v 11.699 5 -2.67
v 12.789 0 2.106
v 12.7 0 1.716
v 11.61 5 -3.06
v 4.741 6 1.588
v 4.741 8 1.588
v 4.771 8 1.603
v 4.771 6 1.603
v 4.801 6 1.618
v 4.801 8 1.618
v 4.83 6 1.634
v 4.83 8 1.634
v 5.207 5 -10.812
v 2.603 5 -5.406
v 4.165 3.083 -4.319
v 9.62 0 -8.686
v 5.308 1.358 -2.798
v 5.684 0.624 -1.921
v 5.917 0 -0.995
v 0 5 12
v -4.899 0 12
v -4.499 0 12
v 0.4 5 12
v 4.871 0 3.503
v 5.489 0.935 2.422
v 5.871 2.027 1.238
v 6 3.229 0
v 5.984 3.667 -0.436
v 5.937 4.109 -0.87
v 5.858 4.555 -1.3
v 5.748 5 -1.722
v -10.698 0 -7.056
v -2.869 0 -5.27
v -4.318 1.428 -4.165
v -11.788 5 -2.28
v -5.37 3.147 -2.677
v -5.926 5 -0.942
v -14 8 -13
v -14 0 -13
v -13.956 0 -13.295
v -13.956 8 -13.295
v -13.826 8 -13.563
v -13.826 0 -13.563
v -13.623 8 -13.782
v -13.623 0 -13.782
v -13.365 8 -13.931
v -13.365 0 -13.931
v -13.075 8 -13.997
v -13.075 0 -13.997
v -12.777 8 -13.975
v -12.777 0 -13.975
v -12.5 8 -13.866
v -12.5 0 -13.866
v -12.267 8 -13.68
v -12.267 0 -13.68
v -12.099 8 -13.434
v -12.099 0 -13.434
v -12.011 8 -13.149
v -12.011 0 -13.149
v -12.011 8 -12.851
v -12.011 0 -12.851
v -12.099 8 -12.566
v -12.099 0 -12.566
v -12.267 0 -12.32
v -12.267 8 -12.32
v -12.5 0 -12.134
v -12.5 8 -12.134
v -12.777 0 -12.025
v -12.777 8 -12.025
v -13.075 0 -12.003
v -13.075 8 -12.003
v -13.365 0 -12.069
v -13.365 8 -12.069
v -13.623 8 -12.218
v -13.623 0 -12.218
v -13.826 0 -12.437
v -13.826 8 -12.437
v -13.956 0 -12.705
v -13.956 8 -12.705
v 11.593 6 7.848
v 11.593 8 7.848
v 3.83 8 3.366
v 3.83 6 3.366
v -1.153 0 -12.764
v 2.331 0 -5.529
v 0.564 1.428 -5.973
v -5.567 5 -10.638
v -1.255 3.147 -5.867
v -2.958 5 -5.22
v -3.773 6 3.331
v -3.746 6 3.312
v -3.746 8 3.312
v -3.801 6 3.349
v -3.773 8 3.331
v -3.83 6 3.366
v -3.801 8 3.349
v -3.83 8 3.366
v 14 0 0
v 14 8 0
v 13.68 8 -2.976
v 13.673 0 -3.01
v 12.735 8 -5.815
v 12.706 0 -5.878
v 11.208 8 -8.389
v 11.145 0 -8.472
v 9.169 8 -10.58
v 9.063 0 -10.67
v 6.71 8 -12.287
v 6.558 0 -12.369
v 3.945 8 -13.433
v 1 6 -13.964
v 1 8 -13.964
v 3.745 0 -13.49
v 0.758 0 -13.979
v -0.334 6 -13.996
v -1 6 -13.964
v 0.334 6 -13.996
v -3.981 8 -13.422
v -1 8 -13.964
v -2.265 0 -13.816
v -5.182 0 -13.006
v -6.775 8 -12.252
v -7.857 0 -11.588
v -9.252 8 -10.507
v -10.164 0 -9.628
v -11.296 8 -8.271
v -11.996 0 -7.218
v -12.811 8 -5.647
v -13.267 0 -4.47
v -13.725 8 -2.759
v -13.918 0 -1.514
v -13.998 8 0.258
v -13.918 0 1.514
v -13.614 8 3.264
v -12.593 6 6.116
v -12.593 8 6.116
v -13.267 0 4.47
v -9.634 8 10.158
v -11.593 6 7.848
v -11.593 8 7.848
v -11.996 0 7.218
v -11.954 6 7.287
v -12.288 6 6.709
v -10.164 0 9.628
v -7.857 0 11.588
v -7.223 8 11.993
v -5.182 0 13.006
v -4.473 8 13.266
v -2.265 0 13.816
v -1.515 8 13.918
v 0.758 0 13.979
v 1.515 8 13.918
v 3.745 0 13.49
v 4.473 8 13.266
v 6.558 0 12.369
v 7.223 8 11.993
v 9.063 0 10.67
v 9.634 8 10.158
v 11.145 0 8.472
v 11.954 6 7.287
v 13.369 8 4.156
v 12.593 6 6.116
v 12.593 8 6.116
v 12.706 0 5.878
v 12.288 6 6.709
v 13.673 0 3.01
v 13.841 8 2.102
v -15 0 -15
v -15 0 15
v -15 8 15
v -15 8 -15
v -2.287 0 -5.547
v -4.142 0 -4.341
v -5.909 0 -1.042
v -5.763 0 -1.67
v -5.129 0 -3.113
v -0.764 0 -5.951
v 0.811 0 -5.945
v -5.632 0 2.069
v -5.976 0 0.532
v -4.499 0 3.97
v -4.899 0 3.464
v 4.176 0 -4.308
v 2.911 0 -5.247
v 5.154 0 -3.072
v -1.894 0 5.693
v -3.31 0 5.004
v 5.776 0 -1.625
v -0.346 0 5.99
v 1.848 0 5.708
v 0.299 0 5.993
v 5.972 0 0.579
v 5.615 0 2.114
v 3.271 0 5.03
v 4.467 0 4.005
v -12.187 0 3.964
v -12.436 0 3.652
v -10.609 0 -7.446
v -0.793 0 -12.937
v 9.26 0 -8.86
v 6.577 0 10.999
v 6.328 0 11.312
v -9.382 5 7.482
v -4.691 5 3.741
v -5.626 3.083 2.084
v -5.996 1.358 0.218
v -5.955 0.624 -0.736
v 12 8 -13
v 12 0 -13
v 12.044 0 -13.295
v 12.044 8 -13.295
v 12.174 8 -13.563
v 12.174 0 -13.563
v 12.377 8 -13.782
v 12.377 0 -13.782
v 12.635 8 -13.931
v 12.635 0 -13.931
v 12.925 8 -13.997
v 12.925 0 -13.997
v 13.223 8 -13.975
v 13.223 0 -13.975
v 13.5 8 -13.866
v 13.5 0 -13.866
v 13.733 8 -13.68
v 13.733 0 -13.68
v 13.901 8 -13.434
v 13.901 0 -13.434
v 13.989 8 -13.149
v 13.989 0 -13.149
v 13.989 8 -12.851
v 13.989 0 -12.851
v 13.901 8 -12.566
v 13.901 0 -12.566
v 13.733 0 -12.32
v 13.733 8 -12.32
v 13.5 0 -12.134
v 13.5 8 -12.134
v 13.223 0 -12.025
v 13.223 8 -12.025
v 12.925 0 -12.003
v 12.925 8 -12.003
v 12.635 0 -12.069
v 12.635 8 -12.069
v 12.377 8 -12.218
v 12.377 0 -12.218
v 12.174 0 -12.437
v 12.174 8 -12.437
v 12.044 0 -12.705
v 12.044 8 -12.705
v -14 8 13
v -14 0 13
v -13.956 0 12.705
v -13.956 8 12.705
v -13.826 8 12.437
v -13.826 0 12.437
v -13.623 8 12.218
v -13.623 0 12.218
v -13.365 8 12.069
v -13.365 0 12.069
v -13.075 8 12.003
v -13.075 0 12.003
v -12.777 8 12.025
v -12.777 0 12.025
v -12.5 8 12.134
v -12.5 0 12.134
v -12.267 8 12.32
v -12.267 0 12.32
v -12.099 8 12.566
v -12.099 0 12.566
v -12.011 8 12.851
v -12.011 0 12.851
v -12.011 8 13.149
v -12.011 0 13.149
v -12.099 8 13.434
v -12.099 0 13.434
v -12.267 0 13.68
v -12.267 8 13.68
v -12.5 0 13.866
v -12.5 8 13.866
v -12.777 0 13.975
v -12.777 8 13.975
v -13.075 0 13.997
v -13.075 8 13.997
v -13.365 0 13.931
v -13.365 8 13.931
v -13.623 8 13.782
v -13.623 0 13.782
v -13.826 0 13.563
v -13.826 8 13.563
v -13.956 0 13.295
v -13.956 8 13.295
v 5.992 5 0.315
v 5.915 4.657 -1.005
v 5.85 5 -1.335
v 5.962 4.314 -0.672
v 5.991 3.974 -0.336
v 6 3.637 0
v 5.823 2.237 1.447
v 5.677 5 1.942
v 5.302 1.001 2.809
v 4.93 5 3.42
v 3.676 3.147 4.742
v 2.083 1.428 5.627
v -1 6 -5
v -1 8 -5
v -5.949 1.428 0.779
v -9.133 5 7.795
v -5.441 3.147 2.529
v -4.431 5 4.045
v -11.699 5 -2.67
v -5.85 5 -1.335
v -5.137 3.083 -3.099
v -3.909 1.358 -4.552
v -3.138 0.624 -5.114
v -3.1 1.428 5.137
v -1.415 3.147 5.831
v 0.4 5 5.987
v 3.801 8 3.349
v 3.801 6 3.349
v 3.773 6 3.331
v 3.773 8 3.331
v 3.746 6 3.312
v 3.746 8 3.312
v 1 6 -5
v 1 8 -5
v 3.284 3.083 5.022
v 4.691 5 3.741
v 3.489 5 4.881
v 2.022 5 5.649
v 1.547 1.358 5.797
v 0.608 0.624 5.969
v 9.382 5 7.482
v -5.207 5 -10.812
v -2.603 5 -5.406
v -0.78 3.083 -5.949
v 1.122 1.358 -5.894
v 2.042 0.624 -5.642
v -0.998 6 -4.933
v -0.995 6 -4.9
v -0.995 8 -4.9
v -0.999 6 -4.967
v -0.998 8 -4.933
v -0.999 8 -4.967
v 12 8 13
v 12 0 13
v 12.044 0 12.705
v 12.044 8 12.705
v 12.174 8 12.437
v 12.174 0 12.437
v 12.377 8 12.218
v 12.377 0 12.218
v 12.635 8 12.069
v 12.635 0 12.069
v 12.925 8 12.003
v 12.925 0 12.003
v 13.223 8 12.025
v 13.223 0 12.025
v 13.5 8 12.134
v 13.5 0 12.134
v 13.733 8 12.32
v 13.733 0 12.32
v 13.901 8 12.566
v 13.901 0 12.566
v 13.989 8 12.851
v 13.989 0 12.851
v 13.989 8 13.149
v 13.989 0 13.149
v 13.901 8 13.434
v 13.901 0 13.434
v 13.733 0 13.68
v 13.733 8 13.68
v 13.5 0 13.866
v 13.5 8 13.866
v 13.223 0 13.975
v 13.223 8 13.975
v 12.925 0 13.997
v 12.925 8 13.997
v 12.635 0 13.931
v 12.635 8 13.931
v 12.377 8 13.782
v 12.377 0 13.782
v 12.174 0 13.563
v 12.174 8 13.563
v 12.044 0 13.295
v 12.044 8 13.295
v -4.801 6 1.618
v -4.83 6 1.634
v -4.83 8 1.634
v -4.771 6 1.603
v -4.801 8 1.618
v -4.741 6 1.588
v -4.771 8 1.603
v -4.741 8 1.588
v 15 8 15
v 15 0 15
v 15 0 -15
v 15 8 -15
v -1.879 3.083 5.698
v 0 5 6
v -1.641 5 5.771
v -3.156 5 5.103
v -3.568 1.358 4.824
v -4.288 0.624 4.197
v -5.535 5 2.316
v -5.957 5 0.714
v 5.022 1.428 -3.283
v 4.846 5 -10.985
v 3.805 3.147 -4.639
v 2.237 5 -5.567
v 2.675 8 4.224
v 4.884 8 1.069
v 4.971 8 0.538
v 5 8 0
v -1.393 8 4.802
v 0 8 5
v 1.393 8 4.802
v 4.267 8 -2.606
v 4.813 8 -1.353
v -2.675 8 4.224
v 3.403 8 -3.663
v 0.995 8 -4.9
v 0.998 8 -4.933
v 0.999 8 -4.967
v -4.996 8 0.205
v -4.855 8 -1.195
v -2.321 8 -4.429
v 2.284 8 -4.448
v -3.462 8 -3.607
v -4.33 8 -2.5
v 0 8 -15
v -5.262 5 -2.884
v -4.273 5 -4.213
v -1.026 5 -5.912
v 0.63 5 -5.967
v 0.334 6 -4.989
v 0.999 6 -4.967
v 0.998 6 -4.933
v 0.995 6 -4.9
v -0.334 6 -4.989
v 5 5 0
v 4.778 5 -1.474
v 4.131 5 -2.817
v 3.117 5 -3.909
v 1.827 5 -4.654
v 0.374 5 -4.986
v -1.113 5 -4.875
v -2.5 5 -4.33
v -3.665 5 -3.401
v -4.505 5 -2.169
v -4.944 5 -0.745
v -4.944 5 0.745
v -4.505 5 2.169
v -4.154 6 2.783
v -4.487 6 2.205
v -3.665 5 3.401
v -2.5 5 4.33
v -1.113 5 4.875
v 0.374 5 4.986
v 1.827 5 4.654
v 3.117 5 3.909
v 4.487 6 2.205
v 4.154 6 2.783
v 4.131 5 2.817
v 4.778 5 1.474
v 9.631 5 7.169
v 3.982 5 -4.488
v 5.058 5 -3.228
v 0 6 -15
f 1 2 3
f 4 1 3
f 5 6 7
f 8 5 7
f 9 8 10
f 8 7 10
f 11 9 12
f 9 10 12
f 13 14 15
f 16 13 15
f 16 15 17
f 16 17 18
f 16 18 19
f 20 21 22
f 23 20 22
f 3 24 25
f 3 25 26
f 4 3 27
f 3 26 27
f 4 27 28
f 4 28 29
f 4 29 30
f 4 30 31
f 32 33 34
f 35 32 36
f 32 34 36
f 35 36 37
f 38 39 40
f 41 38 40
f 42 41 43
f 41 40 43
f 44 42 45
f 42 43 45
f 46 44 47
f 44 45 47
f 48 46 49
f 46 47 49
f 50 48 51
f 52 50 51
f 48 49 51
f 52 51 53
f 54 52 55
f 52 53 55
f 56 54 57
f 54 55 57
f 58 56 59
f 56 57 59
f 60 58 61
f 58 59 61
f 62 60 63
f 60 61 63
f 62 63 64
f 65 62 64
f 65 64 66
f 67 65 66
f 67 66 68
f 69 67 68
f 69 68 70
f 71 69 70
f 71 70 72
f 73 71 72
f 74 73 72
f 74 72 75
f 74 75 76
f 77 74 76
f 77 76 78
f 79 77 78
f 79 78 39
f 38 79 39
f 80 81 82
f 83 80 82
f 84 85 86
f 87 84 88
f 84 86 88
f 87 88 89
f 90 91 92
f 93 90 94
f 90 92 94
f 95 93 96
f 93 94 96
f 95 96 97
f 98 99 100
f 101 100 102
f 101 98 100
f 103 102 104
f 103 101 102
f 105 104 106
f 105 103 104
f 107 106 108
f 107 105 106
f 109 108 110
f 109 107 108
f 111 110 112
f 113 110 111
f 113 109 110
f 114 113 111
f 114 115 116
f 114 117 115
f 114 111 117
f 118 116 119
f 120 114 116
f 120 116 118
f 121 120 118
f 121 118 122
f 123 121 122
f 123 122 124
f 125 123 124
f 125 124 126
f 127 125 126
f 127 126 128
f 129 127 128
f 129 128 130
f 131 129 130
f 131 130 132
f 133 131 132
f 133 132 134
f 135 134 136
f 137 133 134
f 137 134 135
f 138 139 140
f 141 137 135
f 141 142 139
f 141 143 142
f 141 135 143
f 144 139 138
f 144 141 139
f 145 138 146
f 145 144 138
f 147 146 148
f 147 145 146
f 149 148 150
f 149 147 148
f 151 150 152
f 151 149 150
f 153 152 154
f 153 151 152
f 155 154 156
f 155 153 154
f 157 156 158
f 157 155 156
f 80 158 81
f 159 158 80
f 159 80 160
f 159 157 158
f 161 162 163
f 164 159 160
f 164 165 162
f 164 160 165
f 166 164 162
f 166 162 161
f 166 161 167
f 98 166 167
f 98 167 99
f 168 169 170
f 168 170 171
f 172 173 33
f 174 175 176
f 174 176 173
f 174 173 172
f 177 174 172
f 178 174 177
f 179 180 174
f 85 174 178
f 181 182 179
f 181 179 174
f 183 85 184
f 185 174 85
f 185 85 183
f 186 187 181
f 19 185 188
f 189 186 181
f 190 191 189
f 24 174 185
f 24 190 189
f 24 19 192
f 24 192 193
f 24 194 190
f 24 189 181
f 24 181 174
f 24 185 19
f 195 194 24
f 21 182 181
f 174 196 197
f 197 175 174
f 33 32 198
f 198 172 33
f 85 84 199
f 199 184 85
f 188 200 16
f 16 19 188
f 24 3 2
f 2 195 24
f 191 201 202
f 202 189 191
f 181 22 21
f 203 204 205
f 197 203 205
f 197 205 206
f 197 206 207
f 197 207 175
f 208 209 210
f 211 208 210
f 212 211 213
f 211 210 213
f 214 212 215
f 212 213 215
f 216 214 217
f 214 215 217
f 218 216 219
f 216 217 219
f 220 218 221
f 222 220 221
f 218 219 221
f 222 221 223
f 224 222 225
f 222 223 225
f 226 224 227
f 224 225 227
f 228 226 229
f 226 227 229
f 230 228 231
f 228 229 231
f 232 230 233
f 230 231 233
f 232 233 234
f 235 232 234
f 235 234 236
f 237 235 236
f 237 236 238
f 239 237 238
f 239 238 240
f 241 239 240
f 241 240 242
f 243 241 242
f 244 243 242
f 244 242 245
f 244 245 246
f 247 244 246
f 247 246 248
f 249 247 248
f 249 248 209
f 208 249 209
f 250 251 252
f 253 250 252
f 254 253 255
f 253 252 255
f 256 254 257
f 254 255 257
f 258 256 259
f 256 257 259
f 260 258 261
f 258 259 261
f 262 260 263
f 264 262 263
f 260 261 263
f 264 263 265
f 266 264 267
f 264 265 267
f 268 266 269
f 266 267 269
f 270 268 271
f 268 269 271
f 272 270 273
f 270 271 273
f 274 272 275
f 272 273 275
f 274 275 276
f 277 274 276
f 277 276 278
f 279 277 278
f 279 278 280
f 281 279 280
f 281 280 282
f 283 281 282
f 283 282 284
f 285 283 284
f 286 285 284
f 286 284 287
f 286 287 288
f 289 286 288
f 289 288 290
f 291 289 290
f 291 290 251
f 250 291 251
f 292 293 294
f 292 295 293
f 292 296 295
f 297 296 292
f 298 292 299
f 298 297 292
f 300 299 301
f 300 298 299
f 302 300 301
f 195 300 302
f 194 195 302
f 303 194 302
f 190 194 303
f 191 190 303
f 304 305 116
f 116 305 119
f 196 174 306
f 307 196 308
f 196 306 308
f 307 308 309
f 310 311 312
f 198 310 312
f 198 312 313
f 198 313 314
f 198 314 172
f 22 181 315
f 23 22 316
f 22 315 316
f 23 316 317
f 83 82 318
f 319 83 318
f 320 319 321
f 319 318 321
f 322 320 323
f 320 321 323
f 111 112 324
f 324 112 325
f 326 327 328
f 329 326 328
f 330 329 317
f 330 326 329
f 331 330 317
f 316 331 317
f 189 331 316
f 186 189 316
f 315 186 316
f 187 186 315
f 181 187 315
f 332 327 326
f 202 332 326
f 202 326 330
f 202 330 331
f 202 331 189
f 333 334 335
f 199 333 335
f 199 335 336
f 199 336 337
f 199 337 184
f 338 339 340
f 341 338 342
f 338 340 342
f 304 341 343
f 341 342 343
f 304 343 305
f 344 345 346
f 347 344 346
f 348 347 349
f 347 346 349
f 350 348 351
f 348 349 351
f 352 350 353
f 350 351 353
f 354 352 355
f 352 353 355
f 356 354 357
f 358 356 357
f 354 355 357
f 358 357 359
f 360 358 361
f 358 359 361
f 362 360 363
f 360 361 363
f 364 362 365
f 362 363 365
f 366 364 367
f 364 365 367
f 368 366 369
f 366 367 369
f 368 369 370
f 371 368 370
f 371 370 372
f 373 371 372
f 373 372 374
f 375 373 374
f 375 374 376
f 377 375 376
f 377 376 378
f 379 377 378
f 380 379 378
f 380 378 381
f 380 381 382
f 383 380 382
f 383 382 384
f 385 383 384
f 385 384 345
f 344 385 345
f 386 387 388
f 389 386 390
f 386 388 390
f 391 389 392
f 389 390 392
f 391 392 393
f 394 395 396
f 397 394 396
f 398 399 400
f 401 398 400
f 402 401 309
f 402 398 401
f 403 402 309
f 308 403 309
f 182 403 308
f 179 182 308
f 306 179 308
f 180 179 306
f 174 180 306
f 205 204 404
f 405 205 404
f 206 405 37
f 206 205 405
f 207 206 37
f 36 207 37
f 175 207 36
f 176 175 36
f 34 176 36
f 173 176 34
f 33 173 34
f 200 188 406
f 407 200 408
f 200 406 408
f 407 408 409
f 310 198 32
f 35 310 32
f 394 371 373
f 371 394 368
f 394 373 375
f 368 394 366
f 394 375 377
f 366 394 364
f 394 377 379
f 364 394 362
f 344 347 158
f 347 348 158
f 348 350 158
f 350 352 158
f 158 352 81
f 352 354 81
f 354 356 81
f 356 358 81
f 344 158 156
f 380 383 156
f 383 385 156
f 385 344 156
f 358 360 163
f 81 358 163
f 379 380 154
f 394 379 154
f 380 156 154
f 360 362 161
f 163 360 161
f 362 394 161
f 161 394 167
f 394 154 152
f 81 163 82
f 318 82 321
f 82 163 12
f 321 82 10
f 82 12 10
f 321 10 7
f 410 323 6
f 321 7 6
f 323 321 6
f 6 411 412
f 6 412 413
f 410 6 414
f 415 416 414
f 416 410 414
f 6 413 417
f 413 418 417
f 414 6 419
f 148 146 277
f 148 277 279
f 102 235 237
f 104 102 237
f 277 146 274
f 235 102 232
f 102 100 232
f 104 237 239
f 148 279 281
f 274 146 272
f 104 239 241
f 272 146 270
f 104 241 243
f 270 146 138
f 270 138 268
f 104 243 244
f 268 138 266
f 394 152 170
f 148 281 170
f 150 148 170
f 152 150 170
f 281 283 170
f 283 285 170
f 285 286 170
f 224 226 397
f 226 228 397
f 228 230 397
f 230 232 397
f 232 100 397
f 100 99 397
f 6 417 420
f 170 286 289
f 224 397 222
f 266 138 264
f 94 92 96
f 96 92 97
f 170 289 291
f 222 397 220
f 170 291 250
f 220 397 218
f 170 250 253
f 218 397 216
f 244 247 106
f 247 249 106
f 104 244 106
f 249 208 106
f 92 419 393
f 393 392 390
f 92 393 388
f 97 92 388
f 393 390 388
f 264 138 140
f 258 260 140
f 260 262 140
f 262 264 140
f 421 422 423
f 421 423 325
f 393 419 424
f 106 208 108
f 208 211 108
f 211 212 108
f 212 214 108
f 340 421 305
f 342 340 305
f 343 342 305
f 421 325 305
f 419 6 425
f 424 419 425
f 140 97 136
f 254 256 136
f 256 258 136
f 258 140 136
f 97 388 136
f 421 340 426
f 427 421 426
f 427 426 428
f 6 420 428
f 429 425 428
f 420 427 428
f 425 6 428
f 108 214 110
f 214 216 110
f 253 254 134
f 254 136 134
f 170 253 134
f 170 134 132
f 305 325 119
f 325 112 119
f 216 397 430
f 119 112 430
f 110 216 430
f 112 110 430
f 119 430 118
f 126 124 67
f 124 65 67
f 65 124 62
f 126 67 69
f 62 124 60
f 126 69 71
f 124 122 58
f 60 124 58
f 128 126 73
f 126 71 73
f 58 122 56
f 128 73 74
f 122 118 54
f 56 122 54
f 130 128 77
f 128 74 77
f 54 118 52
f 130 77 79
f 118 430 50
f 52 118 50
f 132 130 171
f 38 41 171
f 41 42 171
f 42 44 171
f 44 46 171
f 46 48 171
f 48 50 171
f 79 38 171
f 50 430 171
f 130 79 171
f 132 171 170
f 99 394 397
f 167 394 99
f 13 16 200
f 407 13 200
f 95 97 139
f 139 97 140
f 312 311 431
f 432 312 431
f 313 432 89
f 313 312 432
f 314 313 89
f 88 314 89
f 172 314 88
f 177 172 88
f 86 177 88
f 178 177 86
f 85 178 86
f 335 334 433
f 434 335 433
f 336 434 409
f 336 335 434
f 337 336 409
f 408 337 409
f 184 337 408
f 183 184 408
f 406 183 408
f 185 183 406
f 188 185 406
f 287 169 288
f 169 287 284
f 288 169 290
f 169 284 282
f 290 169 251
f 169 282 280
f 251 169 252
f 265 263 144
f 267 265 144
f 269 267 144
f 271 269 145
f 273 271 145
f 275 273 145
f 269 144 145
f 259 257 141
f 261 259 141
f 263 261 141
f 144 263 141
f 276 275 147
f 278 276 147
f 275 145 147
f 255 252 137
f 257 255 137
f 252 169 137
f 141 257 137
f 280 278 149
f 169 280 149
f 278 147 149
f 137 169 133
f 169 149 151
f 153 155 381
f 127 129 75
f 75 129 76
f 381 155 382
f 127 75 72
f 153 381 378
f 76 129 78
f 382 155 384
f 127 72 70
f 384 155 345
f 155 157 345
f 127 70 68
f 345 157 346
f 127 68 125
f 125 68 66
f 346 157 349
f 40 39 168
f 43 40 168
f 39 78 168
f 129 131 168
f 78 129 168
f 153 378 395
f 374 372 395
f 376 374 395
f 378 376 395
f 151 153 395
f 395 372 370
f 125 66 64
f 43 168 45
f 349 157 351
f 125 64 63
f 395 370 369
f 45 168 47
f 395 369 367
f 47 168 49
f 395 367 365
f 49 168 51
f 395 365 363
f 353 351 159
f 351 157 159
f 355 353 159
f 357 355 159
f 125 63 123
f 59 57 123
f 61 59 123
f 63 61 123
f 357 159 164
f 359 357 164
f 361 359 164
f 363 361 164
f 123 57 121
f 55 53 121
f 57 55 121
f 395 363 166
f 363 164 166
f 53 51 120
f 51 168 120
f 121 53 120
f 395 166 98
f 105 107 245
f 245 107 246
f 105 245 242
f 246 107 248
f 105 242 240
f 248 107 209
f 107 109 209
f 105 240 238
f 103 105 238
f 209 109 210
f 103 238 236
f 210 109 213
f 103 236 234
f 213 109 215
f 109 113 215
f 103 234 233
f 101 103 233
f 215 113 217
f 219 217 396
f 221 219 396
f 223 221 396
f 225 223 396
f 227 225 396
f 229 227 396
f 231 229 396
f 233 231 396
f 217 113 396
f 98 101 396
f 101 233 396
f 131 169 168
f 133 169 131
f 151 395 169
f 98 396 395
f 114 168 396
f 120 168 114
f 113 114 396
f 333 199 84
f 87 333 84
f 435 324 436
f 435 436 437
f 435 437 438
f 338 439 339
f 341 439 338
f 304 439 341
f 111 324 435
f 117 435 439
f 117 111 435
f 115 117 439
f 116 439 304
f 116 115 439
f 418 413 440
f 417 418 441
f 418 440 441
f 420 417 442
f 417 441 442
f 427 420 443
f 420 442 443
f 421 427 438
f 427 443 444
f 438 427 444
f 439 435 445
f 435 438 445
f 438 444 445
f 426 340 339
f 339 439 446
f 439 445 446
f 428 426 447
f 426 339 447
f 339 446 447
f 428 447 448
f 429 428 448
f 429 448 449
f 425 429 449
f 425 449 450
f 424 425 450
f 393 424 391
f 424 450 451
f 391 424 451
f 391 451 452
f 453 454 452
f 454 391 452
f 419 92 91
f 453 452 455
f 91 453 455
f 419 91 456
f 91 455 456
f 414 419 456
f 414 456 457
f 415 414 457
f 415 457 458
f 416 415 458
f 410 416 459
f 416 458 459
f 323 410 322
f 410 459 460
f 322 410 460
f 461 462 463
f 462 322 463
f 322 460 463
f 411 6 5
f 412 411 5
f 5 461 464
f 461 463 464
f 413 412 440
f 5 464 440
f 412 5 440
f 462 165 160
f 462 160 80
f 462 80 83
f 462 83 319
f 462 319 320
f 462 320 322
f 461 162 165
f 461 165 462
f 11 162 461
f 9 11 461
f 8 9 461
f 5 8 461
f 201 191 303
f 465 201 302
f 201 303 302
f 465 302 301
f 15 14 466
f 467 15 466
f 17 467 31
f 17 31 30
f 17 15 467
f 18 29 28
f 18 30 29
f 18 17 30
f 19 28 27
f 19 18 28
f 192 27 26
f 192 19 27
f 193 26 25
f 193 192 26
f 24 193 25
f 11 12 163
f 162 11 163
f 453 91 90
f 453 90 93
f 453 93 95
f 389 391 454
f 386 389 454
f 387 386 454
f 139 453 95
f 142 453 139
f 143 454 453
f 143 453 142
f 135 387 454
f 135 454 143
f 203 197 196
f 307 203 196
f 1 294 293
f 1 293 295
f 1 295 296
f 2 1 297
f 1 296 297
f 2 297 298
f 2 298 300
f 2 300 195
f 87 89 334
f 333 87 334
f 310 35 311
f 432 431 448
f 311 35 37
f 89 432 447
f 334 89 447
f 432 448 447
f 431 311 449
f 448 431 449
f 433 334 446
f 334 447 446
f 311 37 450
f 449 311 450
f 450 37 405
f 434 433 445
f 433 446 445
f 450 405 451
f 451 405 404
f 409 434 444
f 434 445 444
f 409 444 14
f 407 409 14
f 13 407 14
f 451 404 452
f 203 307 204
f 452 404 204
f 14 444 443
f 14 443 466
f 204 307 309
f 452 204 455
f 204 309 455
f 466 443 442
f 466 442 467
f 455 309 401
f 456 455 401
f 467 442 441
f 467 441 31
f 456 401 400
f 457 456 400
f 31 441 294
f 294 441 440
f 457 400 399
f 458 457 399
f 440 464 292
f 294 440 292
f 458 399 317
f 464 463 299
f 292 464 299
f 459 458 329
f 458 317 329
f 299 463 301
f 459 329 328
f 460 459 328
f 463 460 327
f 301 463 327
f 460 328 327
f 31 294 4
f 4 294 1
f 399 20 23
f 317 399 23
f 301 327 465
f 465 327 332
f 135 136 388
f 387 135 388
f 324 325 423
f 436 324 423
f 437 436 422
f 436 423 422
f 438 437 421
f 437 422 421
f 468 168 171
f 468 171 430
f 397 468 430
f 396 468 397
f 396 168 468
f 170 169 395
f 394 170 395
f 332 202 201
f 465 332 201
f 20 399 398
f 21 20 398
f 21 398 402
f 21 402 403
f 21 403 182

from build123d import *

# Parameters (mm, degrees)
SKETCH1_W                 = 30
SKETCH1_H                 = 30
SKETCH1_R                 = 14
BOSS_EXTRUDE1_DEPTH       = 8
SKETCH2_R                 = 5
BOSS_EXTRUDE2_DEPTH       = 8
BOSS_EXTRUDE3_DEPTH       = 2
F_2_0MM_DOWEL_HOLE1_D     = 2
F_2_0MM_DOWEL_HOLE1_DEPTH = 8
SKETCH7_R                 = 6
BOSS_EXTRUDE4_DEPTH       = 5
BOSS_EXTRUDE5_DEPTH       = 12
CIRPATTERN1_COUNT         = 7


with BuildPart() as part:
    # Sketch1 → Boss-Extrude1 (new body)
    with BuildSketch(Plane(origin=(0, 0, 0), x_dir=(1, 0, 0), z_dir=(0, 1, 0))):
        Rectangle(SKETCH1_W, SKETCH1_H)
        Circle(SKETCH1_R, mode=Mode.SUBTRACT)
    extrude(amount=BOSS_EXTRUDE1_DEPTH)



with BuildPart() as body_2:
    # Sketch2 → Boss-Extrude2 (new body)
    with BuildSketch(Plane(origin=(0, 0, 0), x_dir=(1, 0, 0), z_dir=(0, 1, 0))):
        Circle(SKETCH2_R)
    extrude(amount=BOSS_EXTRUDE2_DEPTH)


with BuildPart() as part_1:
    add(part.part)

    add(body_2.part)  # Boss-Extrude3 merges body 2
    # Sketch3 → Boss-Extrude3 (add)
    with BuildSketch(Plane(origin=(0, 8, 0), x_dir=(1, 0, 0), z_dir=(0, 1, 0))):
        with BuildLine():
            Line((-1, 5), (-1, 14))
            ThreePointArc((-1, 14), (0, 15), (1, 14))
            Line((1, 14), (1, 5))
            ThreePointArc((1, 5), (0, 4), (-1, 5))
        make_face()
        with BuildLine():
            Line((-3.830127019, -3.366025404), (-11.624355653, -7.866025404))
            ThreePointArc((-11.624355653, -7.866025404), (-12.990381057, -7.5), (-12.624355653, -6.133974596))
            Line((-12.624355653, -6.133974596), (-4.830127019, -1.633974596))
            ThreePointArc((-4.830127019, -1.633974596), (-3.464101615, -2), (-3.830127019, -3.366025404))
        make_face()
        with BuildLine():
            Line((4.830127019, -1.633974596), (12.624355653, -6.133974596))
            ThreePointArc((12.624355653, -6.133974596), (12.990381057, -7.5), (11.624355653, -7.866025404))
            Line((11.624355653, -7.866025404), (3.830127019, -3.366025404))
            ThreePointArc((3.830127019, -3.366025404), (3.464101615, -2), (4.830127019, -1.633974596))
        make_face()
    extrude(amount=-BOSS_EXTRUDE3_DEPTH)

    # Ø2.0mm Dowel Hole1
    with Locations(Plane(origin=(0, 8, 0), x_dir=(1, 0, 0), z_dir=(0, 1, 0))):
        with Locations((13, 13), (-13, 13), (-13, -13), (13, -13)):
            Hole(F_2_0MM_DOWEL_HOLE1_D / 2, depth=F_2_0MM_DOWEL_HOLE1_DEPTH)

    # Sketch7 → Boss-Extrude4 (add)
    with BuildSketch(Plane.XZ):
        Circle(SKETCH7_R)
    extrude(amount=-BOSS_EXTRUDE4_DEPTH)

    # Sketch9 → Boss-Extrude5 (add)
    with BuildSketch(Plane.XY):
        Polygon((0, 5), (-4.898979486, 0), (-4.498979486, 0), (0.4, 5), align=None)
    boss_extrude5 = extrude(amount=BOSS_EXTRUDE5_DEPTH)

    # CirPattern1: Boss-Extrude5 ×7 about axis
    cirpattern1_axis = Axis((0, 0, 0), (0, 1, 0))
    for i in range(1, CIRPATTERN1_COUNT):
        add(boss_extrude5.rotate(cirpattern1_axis, i * 360 / CIRPATTERN1_COUNT))


solid = part_1.part
